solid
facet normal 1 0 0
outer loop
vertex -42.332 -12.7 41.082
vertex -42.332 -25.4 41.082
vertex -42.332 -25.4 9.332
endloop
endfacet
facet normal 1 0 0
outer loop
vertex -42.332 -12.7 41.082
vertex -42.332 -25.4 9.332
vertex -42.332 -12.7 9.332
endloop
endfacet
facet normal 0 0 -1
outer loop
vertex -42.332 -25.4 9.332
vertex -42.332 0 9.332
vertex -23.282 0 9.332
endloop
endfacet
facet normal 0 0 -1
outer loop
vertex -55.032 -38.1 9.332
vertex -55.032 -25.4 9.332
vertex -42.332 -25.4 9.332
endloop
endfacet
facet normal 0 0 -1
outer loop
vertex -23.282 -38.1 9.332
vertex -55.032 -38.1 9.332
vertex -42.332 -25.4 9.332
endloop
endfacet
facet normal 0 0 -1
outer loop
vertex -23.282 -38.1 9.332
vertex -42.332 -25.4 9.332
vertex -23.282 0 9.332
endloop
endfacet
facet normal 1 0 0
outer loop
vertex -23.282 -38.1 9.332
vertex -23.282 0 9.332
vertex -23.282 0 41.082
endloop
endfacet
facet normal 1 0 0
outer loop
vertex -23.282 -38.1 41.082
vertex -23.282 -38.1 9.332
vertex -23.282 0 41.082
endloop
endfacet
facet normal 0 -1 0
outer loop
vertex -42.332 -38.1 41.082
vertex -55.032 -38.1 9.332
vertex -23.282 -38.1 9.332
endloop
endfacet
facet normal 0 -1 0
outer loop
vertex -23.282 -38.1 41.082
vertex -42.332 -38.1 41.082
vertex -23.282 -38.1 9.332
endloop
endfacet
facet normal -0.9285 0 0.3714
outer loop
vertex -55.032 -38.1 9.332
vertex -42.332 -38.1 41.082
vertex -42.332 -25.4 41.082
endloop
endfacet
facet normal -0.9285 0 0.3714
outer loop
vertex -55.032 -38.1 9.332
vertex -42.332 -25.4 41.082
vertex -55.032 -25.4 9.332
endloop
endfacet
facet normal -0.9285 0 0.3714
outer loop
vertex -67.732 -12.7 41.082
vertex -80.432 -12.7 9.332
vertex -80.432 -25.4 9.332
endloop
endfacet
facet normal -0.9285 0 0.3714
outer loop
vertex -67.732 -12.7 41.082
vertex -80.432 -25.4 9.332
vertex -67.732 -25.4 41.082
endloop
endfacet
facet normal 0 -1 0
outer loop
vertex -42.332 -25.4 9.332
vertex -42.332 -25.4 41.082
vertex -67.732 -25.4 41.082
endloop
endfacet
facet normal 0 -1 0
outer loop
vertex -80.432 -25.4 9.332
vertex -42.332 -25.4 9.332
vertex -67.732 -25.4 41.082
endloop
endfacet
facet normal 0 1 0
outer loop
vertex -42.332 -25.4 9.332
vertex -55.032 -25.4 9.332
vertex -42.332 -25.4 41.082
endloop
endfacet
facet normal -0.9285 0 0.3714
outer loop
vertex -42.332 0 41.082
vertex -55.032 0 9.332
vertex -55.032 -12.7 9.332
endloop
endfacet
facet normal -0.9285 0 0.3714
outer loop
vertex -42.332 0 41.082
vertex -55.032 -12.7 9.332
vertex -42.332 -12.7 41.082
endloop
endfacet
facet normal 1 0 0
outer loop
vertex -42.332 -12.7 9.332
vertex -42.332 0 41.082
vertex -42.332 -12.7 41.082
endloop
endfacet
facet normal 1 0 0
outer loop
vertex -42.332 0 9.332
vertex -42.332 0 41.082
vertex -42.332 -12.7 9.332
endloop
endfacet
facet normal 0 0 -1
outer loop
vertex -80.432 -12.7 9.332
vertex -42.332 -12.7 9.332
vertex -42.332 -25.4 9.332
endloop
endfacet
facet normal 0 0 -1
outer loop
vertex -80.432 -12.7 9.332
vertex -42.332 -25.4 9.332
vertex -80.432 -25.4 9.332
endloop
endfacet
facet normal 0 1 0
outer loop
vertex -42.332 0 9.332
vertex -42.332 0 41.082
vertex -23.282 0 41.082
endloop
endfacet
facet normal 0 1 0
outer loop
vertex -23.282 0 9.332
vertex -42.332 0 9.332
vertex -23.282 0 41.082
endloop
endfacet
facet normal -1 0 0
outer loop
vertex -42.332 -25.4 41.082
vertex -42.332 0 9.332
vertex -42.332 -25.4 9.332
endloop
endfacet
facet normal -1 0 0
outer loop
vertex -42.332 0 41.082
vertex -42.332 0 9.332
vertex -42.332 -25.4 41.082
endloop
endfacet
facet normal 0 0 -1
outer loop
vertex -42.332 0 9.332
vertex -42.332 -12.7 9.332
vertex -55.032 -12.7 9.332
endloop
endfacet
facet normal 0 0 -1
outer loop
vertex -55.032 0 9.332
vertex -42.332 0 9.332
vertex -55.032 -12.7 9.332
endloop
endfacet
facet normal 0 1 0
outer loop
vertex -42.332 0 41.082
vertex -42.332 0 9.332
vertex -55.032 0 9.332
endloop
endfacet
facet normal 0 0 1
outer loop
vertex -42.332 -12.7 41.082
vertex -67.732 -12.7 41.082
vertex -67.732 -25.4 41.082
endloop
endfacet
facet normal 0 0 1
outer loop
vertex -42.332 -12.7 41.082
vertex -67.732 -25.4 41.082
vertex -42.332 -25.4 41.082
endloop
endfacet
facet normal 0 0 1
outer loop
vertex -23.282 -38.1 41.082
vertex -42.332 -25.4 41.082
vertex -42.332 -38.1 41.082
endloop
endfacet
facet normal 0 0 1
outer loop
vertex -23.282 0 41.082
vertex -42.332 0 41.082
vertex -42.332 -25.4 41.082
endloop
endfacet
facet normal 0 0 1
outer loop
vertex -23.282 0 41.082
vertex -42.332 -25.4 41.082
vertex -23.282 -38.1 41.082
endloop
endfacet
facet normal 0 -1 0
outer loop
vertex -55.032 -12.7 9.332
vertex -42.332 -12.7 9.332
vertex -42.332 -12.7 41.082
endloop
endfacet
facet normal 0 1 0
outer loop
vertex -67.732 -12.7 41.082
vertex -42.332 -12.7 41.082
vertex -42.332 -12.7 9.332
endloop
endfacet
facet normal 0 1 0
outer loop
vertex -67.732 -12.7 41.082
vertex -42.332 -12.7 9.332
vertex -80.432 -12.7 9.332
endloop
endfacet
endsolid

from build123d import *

# Parameters (mm, degrees)
F0_W     = 19.05
F0_H     = 31.75
F1_DEPTH = 38.1
F3_DEPTH = 12.7
F5_DEPTH = 12.7
F6_W     = 25.4
F6_H     = 12.7
F7_DEPTH = 31.75
F9_DEPTH = 12.7


with BuildPart() as f1:
    # F0 (on Front) → F1 (new body)
    with BuildSketch(Plane.XZ):
        with Locations((-32.806787, 25.206513)):
            Rectangle(F0_W, F0_H)
    extrude(amount=F1_DEPTH)

    # F4 (on face) → F5 (join)
    with BuildSketch(Plane.XZ.offset(38.1)):
        Polygon((-42.331787, 9.331513), (-42.331787, 41.081513), (-55.031787, 9.331513), align=None)
    extrude(amount=-F5_DEPTH)


with BuildPart() as f3:
    # F2 (on face) → F3 (new body)
    with BuildSketch(Plane(origin=(0, 0, 0), x_dir=(-1, 0, 0), z_dir=(0, 1, 0))):
        Polygon((42.331787, 41.081513), (42.331787, 9.331513), (55.031787, 9.331513), align=None)
    extrude(amount=-F3_DEPTH)


with BuildPart() as f7:
    # F6 (on face) → F7 (new body)
    with BuildSketch(Plane.XY.offset(41.081513)):
        with Locations((-55.031787, -19.05)):
            Rectangle(F6_W, F6_H)
    extrude(amount=-F7_DEPTH)

    # F8 (on face) → F9 (join)
    with BuildSketch(Plane(origin=(0, -12.7, 0), x_dir=(-1, 0, 0), z_dir=(0, 1, 0))):
        Polygon((80.431787, 9.331513), (67.731787, 41.081513), (67.731787, 9.331513), align=None)
    extrude(amount=-F9_DEPTH)


solid = Compound([f1.part, f3.part, f7.part])
